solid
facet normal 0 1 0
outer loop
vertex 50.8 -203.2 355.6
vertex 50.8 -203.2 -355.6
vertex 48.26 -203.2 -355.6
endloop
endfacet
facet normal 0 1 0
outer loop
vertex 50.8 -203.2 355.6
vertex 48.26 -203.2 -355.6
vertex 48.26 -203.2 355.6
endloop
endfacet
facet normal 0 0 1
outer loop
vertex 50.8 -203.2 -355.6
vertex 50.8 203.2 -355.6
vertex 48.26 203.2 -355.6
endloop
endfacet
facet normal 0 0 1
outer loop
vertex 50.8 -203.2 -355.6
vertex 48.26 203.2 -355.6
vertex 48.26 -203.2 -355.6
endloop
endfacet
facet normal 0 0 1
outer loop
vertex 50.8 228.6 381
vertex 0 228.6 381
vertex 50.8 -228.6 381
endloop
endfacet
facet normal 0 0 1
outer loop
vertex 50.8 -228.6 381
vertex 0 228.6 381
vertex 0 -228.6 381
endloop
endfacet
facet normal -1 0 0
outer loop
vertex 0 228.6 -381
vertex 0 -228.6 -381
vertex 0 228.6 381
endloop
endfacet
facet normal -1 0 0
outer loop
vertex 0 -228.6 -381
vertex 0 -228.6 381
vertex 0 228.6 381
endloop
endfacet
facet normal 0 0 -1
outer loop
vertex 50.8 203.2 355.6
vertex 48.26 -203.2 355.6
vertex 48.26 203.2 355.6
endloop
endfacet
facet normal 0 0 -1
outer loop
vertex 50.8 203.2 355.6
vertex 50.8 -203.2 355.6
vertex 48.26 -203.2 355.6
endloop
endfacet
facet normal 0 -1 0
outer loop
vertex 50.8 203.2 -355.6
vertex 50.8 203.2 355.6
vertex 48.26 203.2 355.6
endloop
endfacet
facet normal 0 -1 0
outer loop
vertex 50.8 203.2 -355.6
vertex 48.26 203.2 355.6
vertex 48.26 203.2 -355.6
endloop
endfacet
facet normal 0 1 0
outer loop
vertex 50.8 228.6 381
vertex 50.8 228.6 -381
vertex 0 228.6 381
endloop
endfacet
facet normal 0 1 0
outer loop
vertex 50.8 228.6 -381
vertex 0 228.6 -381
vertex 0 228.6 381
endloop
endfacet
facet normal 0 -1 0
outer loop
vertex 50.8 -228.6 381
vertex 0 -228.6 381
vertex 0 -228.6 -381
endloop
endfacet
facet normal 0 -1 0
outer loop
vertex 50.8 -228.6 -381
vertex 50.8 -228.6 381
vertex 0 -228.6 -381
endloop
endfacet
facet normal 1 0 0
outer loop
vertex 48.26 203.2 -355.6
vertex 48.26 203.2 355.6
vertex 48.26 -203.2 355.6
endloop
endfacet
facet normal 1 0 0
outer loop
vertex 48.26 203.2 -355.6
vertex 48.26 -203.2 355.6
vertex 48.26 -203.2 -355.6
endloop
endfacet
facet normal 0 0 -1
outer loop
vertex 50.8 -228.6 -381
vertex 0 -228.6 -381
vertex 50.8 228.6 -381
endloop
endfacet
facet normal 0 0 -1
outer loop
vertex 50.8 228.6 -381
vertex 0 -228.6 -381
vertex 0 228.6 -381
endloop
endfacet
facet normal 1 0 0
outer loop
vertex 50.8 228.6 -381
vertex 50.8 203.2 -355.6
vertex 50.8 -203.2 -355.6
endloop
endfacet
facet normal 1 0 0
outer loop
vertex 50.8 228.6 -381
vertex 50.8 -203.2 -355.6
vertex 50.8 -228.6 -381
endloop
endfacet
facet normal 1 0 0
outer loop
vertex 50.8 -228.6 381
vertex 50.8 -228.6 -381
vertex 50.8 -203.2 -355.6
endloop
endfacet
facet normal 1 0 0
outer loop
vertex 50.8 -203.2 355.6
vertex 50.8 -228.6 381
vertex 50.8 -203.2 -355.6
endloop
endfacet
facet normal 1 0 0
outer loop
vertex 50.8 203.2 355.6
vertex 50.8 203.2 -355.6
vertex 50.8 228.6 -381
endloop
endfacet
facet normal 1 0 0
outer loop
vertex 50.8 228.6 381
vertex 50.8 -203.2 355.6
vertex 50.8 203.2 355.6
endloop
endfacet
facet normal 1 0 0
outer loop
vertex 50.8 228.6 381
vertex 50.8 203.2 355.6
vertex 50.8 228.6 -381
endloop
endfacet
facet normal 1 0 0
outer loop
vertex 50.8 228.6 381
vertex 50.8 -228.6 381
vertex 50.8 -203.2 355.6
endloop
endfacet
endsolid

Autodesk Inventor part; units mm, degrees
ref_plane "YZ Plane" through (0, 0, 0) normal (1, 0, 0) x (0, 1, 0)
ref_plane "XZ Plane" through (0, 0, 0) normal (0, 1, 0) x (-1, 0, 0)
ref_plane "XY Plane" through (0, 0, 0) normal (0, 0, 1) x (1, 0, 0)
sketch "Sketch1" plane through (0, 0, 0) normal (1, 0, 0) x (0, 1, 0)
  line L0 (228.6, 381) -> (-228.6, 381)
  line L1 (-228.6, 381) -> (-228.6, -381)
  line L2 (-228.6, -381) -> (228.6, -381)
  line L3 (228.6, -381) -> (228.6, 381)
  point P0 (0, 0)
  point P1 (228.6, 0)
  point P2 (0, -381)
  dimension "d0" = 762
  dimension "d1" = 457.2
extrude "Extrusion1" add sketch "Sketch1" along normal blind 50.8
sketch "Sketch2" plane through (50.8, 0, 0) normal (1, 0, 0) x (0, 0, -1)
  line L0 (381, 228.6) -> (-381, 228.6) projected
  line L1 (-381, 228.6) -> (-381, -228.6) projected
  line L2 (-381, -228.6) -> (381, -228.6) projected
  line L3 (381, -228.6) -> (381, 228.6) projected
  line L4 (-355.6, 203.2) -> (355.6, 203.2)
  line L5 (355.6, 203.2) -> (355.6, -203.2)
  line L6 (355.6, -203.2) -> (-355.6, -203.2)
  line L7 (-355.6, -203.2) -> (-355.6, 203.2)
  point P0 (0, 0)
  dimension "d4" = 25.4
extrude "Extrusion2" cut sketch "Sketch2" against normal blind 2.54 contours L4 L5 L6 L7
properties part number "Television"
